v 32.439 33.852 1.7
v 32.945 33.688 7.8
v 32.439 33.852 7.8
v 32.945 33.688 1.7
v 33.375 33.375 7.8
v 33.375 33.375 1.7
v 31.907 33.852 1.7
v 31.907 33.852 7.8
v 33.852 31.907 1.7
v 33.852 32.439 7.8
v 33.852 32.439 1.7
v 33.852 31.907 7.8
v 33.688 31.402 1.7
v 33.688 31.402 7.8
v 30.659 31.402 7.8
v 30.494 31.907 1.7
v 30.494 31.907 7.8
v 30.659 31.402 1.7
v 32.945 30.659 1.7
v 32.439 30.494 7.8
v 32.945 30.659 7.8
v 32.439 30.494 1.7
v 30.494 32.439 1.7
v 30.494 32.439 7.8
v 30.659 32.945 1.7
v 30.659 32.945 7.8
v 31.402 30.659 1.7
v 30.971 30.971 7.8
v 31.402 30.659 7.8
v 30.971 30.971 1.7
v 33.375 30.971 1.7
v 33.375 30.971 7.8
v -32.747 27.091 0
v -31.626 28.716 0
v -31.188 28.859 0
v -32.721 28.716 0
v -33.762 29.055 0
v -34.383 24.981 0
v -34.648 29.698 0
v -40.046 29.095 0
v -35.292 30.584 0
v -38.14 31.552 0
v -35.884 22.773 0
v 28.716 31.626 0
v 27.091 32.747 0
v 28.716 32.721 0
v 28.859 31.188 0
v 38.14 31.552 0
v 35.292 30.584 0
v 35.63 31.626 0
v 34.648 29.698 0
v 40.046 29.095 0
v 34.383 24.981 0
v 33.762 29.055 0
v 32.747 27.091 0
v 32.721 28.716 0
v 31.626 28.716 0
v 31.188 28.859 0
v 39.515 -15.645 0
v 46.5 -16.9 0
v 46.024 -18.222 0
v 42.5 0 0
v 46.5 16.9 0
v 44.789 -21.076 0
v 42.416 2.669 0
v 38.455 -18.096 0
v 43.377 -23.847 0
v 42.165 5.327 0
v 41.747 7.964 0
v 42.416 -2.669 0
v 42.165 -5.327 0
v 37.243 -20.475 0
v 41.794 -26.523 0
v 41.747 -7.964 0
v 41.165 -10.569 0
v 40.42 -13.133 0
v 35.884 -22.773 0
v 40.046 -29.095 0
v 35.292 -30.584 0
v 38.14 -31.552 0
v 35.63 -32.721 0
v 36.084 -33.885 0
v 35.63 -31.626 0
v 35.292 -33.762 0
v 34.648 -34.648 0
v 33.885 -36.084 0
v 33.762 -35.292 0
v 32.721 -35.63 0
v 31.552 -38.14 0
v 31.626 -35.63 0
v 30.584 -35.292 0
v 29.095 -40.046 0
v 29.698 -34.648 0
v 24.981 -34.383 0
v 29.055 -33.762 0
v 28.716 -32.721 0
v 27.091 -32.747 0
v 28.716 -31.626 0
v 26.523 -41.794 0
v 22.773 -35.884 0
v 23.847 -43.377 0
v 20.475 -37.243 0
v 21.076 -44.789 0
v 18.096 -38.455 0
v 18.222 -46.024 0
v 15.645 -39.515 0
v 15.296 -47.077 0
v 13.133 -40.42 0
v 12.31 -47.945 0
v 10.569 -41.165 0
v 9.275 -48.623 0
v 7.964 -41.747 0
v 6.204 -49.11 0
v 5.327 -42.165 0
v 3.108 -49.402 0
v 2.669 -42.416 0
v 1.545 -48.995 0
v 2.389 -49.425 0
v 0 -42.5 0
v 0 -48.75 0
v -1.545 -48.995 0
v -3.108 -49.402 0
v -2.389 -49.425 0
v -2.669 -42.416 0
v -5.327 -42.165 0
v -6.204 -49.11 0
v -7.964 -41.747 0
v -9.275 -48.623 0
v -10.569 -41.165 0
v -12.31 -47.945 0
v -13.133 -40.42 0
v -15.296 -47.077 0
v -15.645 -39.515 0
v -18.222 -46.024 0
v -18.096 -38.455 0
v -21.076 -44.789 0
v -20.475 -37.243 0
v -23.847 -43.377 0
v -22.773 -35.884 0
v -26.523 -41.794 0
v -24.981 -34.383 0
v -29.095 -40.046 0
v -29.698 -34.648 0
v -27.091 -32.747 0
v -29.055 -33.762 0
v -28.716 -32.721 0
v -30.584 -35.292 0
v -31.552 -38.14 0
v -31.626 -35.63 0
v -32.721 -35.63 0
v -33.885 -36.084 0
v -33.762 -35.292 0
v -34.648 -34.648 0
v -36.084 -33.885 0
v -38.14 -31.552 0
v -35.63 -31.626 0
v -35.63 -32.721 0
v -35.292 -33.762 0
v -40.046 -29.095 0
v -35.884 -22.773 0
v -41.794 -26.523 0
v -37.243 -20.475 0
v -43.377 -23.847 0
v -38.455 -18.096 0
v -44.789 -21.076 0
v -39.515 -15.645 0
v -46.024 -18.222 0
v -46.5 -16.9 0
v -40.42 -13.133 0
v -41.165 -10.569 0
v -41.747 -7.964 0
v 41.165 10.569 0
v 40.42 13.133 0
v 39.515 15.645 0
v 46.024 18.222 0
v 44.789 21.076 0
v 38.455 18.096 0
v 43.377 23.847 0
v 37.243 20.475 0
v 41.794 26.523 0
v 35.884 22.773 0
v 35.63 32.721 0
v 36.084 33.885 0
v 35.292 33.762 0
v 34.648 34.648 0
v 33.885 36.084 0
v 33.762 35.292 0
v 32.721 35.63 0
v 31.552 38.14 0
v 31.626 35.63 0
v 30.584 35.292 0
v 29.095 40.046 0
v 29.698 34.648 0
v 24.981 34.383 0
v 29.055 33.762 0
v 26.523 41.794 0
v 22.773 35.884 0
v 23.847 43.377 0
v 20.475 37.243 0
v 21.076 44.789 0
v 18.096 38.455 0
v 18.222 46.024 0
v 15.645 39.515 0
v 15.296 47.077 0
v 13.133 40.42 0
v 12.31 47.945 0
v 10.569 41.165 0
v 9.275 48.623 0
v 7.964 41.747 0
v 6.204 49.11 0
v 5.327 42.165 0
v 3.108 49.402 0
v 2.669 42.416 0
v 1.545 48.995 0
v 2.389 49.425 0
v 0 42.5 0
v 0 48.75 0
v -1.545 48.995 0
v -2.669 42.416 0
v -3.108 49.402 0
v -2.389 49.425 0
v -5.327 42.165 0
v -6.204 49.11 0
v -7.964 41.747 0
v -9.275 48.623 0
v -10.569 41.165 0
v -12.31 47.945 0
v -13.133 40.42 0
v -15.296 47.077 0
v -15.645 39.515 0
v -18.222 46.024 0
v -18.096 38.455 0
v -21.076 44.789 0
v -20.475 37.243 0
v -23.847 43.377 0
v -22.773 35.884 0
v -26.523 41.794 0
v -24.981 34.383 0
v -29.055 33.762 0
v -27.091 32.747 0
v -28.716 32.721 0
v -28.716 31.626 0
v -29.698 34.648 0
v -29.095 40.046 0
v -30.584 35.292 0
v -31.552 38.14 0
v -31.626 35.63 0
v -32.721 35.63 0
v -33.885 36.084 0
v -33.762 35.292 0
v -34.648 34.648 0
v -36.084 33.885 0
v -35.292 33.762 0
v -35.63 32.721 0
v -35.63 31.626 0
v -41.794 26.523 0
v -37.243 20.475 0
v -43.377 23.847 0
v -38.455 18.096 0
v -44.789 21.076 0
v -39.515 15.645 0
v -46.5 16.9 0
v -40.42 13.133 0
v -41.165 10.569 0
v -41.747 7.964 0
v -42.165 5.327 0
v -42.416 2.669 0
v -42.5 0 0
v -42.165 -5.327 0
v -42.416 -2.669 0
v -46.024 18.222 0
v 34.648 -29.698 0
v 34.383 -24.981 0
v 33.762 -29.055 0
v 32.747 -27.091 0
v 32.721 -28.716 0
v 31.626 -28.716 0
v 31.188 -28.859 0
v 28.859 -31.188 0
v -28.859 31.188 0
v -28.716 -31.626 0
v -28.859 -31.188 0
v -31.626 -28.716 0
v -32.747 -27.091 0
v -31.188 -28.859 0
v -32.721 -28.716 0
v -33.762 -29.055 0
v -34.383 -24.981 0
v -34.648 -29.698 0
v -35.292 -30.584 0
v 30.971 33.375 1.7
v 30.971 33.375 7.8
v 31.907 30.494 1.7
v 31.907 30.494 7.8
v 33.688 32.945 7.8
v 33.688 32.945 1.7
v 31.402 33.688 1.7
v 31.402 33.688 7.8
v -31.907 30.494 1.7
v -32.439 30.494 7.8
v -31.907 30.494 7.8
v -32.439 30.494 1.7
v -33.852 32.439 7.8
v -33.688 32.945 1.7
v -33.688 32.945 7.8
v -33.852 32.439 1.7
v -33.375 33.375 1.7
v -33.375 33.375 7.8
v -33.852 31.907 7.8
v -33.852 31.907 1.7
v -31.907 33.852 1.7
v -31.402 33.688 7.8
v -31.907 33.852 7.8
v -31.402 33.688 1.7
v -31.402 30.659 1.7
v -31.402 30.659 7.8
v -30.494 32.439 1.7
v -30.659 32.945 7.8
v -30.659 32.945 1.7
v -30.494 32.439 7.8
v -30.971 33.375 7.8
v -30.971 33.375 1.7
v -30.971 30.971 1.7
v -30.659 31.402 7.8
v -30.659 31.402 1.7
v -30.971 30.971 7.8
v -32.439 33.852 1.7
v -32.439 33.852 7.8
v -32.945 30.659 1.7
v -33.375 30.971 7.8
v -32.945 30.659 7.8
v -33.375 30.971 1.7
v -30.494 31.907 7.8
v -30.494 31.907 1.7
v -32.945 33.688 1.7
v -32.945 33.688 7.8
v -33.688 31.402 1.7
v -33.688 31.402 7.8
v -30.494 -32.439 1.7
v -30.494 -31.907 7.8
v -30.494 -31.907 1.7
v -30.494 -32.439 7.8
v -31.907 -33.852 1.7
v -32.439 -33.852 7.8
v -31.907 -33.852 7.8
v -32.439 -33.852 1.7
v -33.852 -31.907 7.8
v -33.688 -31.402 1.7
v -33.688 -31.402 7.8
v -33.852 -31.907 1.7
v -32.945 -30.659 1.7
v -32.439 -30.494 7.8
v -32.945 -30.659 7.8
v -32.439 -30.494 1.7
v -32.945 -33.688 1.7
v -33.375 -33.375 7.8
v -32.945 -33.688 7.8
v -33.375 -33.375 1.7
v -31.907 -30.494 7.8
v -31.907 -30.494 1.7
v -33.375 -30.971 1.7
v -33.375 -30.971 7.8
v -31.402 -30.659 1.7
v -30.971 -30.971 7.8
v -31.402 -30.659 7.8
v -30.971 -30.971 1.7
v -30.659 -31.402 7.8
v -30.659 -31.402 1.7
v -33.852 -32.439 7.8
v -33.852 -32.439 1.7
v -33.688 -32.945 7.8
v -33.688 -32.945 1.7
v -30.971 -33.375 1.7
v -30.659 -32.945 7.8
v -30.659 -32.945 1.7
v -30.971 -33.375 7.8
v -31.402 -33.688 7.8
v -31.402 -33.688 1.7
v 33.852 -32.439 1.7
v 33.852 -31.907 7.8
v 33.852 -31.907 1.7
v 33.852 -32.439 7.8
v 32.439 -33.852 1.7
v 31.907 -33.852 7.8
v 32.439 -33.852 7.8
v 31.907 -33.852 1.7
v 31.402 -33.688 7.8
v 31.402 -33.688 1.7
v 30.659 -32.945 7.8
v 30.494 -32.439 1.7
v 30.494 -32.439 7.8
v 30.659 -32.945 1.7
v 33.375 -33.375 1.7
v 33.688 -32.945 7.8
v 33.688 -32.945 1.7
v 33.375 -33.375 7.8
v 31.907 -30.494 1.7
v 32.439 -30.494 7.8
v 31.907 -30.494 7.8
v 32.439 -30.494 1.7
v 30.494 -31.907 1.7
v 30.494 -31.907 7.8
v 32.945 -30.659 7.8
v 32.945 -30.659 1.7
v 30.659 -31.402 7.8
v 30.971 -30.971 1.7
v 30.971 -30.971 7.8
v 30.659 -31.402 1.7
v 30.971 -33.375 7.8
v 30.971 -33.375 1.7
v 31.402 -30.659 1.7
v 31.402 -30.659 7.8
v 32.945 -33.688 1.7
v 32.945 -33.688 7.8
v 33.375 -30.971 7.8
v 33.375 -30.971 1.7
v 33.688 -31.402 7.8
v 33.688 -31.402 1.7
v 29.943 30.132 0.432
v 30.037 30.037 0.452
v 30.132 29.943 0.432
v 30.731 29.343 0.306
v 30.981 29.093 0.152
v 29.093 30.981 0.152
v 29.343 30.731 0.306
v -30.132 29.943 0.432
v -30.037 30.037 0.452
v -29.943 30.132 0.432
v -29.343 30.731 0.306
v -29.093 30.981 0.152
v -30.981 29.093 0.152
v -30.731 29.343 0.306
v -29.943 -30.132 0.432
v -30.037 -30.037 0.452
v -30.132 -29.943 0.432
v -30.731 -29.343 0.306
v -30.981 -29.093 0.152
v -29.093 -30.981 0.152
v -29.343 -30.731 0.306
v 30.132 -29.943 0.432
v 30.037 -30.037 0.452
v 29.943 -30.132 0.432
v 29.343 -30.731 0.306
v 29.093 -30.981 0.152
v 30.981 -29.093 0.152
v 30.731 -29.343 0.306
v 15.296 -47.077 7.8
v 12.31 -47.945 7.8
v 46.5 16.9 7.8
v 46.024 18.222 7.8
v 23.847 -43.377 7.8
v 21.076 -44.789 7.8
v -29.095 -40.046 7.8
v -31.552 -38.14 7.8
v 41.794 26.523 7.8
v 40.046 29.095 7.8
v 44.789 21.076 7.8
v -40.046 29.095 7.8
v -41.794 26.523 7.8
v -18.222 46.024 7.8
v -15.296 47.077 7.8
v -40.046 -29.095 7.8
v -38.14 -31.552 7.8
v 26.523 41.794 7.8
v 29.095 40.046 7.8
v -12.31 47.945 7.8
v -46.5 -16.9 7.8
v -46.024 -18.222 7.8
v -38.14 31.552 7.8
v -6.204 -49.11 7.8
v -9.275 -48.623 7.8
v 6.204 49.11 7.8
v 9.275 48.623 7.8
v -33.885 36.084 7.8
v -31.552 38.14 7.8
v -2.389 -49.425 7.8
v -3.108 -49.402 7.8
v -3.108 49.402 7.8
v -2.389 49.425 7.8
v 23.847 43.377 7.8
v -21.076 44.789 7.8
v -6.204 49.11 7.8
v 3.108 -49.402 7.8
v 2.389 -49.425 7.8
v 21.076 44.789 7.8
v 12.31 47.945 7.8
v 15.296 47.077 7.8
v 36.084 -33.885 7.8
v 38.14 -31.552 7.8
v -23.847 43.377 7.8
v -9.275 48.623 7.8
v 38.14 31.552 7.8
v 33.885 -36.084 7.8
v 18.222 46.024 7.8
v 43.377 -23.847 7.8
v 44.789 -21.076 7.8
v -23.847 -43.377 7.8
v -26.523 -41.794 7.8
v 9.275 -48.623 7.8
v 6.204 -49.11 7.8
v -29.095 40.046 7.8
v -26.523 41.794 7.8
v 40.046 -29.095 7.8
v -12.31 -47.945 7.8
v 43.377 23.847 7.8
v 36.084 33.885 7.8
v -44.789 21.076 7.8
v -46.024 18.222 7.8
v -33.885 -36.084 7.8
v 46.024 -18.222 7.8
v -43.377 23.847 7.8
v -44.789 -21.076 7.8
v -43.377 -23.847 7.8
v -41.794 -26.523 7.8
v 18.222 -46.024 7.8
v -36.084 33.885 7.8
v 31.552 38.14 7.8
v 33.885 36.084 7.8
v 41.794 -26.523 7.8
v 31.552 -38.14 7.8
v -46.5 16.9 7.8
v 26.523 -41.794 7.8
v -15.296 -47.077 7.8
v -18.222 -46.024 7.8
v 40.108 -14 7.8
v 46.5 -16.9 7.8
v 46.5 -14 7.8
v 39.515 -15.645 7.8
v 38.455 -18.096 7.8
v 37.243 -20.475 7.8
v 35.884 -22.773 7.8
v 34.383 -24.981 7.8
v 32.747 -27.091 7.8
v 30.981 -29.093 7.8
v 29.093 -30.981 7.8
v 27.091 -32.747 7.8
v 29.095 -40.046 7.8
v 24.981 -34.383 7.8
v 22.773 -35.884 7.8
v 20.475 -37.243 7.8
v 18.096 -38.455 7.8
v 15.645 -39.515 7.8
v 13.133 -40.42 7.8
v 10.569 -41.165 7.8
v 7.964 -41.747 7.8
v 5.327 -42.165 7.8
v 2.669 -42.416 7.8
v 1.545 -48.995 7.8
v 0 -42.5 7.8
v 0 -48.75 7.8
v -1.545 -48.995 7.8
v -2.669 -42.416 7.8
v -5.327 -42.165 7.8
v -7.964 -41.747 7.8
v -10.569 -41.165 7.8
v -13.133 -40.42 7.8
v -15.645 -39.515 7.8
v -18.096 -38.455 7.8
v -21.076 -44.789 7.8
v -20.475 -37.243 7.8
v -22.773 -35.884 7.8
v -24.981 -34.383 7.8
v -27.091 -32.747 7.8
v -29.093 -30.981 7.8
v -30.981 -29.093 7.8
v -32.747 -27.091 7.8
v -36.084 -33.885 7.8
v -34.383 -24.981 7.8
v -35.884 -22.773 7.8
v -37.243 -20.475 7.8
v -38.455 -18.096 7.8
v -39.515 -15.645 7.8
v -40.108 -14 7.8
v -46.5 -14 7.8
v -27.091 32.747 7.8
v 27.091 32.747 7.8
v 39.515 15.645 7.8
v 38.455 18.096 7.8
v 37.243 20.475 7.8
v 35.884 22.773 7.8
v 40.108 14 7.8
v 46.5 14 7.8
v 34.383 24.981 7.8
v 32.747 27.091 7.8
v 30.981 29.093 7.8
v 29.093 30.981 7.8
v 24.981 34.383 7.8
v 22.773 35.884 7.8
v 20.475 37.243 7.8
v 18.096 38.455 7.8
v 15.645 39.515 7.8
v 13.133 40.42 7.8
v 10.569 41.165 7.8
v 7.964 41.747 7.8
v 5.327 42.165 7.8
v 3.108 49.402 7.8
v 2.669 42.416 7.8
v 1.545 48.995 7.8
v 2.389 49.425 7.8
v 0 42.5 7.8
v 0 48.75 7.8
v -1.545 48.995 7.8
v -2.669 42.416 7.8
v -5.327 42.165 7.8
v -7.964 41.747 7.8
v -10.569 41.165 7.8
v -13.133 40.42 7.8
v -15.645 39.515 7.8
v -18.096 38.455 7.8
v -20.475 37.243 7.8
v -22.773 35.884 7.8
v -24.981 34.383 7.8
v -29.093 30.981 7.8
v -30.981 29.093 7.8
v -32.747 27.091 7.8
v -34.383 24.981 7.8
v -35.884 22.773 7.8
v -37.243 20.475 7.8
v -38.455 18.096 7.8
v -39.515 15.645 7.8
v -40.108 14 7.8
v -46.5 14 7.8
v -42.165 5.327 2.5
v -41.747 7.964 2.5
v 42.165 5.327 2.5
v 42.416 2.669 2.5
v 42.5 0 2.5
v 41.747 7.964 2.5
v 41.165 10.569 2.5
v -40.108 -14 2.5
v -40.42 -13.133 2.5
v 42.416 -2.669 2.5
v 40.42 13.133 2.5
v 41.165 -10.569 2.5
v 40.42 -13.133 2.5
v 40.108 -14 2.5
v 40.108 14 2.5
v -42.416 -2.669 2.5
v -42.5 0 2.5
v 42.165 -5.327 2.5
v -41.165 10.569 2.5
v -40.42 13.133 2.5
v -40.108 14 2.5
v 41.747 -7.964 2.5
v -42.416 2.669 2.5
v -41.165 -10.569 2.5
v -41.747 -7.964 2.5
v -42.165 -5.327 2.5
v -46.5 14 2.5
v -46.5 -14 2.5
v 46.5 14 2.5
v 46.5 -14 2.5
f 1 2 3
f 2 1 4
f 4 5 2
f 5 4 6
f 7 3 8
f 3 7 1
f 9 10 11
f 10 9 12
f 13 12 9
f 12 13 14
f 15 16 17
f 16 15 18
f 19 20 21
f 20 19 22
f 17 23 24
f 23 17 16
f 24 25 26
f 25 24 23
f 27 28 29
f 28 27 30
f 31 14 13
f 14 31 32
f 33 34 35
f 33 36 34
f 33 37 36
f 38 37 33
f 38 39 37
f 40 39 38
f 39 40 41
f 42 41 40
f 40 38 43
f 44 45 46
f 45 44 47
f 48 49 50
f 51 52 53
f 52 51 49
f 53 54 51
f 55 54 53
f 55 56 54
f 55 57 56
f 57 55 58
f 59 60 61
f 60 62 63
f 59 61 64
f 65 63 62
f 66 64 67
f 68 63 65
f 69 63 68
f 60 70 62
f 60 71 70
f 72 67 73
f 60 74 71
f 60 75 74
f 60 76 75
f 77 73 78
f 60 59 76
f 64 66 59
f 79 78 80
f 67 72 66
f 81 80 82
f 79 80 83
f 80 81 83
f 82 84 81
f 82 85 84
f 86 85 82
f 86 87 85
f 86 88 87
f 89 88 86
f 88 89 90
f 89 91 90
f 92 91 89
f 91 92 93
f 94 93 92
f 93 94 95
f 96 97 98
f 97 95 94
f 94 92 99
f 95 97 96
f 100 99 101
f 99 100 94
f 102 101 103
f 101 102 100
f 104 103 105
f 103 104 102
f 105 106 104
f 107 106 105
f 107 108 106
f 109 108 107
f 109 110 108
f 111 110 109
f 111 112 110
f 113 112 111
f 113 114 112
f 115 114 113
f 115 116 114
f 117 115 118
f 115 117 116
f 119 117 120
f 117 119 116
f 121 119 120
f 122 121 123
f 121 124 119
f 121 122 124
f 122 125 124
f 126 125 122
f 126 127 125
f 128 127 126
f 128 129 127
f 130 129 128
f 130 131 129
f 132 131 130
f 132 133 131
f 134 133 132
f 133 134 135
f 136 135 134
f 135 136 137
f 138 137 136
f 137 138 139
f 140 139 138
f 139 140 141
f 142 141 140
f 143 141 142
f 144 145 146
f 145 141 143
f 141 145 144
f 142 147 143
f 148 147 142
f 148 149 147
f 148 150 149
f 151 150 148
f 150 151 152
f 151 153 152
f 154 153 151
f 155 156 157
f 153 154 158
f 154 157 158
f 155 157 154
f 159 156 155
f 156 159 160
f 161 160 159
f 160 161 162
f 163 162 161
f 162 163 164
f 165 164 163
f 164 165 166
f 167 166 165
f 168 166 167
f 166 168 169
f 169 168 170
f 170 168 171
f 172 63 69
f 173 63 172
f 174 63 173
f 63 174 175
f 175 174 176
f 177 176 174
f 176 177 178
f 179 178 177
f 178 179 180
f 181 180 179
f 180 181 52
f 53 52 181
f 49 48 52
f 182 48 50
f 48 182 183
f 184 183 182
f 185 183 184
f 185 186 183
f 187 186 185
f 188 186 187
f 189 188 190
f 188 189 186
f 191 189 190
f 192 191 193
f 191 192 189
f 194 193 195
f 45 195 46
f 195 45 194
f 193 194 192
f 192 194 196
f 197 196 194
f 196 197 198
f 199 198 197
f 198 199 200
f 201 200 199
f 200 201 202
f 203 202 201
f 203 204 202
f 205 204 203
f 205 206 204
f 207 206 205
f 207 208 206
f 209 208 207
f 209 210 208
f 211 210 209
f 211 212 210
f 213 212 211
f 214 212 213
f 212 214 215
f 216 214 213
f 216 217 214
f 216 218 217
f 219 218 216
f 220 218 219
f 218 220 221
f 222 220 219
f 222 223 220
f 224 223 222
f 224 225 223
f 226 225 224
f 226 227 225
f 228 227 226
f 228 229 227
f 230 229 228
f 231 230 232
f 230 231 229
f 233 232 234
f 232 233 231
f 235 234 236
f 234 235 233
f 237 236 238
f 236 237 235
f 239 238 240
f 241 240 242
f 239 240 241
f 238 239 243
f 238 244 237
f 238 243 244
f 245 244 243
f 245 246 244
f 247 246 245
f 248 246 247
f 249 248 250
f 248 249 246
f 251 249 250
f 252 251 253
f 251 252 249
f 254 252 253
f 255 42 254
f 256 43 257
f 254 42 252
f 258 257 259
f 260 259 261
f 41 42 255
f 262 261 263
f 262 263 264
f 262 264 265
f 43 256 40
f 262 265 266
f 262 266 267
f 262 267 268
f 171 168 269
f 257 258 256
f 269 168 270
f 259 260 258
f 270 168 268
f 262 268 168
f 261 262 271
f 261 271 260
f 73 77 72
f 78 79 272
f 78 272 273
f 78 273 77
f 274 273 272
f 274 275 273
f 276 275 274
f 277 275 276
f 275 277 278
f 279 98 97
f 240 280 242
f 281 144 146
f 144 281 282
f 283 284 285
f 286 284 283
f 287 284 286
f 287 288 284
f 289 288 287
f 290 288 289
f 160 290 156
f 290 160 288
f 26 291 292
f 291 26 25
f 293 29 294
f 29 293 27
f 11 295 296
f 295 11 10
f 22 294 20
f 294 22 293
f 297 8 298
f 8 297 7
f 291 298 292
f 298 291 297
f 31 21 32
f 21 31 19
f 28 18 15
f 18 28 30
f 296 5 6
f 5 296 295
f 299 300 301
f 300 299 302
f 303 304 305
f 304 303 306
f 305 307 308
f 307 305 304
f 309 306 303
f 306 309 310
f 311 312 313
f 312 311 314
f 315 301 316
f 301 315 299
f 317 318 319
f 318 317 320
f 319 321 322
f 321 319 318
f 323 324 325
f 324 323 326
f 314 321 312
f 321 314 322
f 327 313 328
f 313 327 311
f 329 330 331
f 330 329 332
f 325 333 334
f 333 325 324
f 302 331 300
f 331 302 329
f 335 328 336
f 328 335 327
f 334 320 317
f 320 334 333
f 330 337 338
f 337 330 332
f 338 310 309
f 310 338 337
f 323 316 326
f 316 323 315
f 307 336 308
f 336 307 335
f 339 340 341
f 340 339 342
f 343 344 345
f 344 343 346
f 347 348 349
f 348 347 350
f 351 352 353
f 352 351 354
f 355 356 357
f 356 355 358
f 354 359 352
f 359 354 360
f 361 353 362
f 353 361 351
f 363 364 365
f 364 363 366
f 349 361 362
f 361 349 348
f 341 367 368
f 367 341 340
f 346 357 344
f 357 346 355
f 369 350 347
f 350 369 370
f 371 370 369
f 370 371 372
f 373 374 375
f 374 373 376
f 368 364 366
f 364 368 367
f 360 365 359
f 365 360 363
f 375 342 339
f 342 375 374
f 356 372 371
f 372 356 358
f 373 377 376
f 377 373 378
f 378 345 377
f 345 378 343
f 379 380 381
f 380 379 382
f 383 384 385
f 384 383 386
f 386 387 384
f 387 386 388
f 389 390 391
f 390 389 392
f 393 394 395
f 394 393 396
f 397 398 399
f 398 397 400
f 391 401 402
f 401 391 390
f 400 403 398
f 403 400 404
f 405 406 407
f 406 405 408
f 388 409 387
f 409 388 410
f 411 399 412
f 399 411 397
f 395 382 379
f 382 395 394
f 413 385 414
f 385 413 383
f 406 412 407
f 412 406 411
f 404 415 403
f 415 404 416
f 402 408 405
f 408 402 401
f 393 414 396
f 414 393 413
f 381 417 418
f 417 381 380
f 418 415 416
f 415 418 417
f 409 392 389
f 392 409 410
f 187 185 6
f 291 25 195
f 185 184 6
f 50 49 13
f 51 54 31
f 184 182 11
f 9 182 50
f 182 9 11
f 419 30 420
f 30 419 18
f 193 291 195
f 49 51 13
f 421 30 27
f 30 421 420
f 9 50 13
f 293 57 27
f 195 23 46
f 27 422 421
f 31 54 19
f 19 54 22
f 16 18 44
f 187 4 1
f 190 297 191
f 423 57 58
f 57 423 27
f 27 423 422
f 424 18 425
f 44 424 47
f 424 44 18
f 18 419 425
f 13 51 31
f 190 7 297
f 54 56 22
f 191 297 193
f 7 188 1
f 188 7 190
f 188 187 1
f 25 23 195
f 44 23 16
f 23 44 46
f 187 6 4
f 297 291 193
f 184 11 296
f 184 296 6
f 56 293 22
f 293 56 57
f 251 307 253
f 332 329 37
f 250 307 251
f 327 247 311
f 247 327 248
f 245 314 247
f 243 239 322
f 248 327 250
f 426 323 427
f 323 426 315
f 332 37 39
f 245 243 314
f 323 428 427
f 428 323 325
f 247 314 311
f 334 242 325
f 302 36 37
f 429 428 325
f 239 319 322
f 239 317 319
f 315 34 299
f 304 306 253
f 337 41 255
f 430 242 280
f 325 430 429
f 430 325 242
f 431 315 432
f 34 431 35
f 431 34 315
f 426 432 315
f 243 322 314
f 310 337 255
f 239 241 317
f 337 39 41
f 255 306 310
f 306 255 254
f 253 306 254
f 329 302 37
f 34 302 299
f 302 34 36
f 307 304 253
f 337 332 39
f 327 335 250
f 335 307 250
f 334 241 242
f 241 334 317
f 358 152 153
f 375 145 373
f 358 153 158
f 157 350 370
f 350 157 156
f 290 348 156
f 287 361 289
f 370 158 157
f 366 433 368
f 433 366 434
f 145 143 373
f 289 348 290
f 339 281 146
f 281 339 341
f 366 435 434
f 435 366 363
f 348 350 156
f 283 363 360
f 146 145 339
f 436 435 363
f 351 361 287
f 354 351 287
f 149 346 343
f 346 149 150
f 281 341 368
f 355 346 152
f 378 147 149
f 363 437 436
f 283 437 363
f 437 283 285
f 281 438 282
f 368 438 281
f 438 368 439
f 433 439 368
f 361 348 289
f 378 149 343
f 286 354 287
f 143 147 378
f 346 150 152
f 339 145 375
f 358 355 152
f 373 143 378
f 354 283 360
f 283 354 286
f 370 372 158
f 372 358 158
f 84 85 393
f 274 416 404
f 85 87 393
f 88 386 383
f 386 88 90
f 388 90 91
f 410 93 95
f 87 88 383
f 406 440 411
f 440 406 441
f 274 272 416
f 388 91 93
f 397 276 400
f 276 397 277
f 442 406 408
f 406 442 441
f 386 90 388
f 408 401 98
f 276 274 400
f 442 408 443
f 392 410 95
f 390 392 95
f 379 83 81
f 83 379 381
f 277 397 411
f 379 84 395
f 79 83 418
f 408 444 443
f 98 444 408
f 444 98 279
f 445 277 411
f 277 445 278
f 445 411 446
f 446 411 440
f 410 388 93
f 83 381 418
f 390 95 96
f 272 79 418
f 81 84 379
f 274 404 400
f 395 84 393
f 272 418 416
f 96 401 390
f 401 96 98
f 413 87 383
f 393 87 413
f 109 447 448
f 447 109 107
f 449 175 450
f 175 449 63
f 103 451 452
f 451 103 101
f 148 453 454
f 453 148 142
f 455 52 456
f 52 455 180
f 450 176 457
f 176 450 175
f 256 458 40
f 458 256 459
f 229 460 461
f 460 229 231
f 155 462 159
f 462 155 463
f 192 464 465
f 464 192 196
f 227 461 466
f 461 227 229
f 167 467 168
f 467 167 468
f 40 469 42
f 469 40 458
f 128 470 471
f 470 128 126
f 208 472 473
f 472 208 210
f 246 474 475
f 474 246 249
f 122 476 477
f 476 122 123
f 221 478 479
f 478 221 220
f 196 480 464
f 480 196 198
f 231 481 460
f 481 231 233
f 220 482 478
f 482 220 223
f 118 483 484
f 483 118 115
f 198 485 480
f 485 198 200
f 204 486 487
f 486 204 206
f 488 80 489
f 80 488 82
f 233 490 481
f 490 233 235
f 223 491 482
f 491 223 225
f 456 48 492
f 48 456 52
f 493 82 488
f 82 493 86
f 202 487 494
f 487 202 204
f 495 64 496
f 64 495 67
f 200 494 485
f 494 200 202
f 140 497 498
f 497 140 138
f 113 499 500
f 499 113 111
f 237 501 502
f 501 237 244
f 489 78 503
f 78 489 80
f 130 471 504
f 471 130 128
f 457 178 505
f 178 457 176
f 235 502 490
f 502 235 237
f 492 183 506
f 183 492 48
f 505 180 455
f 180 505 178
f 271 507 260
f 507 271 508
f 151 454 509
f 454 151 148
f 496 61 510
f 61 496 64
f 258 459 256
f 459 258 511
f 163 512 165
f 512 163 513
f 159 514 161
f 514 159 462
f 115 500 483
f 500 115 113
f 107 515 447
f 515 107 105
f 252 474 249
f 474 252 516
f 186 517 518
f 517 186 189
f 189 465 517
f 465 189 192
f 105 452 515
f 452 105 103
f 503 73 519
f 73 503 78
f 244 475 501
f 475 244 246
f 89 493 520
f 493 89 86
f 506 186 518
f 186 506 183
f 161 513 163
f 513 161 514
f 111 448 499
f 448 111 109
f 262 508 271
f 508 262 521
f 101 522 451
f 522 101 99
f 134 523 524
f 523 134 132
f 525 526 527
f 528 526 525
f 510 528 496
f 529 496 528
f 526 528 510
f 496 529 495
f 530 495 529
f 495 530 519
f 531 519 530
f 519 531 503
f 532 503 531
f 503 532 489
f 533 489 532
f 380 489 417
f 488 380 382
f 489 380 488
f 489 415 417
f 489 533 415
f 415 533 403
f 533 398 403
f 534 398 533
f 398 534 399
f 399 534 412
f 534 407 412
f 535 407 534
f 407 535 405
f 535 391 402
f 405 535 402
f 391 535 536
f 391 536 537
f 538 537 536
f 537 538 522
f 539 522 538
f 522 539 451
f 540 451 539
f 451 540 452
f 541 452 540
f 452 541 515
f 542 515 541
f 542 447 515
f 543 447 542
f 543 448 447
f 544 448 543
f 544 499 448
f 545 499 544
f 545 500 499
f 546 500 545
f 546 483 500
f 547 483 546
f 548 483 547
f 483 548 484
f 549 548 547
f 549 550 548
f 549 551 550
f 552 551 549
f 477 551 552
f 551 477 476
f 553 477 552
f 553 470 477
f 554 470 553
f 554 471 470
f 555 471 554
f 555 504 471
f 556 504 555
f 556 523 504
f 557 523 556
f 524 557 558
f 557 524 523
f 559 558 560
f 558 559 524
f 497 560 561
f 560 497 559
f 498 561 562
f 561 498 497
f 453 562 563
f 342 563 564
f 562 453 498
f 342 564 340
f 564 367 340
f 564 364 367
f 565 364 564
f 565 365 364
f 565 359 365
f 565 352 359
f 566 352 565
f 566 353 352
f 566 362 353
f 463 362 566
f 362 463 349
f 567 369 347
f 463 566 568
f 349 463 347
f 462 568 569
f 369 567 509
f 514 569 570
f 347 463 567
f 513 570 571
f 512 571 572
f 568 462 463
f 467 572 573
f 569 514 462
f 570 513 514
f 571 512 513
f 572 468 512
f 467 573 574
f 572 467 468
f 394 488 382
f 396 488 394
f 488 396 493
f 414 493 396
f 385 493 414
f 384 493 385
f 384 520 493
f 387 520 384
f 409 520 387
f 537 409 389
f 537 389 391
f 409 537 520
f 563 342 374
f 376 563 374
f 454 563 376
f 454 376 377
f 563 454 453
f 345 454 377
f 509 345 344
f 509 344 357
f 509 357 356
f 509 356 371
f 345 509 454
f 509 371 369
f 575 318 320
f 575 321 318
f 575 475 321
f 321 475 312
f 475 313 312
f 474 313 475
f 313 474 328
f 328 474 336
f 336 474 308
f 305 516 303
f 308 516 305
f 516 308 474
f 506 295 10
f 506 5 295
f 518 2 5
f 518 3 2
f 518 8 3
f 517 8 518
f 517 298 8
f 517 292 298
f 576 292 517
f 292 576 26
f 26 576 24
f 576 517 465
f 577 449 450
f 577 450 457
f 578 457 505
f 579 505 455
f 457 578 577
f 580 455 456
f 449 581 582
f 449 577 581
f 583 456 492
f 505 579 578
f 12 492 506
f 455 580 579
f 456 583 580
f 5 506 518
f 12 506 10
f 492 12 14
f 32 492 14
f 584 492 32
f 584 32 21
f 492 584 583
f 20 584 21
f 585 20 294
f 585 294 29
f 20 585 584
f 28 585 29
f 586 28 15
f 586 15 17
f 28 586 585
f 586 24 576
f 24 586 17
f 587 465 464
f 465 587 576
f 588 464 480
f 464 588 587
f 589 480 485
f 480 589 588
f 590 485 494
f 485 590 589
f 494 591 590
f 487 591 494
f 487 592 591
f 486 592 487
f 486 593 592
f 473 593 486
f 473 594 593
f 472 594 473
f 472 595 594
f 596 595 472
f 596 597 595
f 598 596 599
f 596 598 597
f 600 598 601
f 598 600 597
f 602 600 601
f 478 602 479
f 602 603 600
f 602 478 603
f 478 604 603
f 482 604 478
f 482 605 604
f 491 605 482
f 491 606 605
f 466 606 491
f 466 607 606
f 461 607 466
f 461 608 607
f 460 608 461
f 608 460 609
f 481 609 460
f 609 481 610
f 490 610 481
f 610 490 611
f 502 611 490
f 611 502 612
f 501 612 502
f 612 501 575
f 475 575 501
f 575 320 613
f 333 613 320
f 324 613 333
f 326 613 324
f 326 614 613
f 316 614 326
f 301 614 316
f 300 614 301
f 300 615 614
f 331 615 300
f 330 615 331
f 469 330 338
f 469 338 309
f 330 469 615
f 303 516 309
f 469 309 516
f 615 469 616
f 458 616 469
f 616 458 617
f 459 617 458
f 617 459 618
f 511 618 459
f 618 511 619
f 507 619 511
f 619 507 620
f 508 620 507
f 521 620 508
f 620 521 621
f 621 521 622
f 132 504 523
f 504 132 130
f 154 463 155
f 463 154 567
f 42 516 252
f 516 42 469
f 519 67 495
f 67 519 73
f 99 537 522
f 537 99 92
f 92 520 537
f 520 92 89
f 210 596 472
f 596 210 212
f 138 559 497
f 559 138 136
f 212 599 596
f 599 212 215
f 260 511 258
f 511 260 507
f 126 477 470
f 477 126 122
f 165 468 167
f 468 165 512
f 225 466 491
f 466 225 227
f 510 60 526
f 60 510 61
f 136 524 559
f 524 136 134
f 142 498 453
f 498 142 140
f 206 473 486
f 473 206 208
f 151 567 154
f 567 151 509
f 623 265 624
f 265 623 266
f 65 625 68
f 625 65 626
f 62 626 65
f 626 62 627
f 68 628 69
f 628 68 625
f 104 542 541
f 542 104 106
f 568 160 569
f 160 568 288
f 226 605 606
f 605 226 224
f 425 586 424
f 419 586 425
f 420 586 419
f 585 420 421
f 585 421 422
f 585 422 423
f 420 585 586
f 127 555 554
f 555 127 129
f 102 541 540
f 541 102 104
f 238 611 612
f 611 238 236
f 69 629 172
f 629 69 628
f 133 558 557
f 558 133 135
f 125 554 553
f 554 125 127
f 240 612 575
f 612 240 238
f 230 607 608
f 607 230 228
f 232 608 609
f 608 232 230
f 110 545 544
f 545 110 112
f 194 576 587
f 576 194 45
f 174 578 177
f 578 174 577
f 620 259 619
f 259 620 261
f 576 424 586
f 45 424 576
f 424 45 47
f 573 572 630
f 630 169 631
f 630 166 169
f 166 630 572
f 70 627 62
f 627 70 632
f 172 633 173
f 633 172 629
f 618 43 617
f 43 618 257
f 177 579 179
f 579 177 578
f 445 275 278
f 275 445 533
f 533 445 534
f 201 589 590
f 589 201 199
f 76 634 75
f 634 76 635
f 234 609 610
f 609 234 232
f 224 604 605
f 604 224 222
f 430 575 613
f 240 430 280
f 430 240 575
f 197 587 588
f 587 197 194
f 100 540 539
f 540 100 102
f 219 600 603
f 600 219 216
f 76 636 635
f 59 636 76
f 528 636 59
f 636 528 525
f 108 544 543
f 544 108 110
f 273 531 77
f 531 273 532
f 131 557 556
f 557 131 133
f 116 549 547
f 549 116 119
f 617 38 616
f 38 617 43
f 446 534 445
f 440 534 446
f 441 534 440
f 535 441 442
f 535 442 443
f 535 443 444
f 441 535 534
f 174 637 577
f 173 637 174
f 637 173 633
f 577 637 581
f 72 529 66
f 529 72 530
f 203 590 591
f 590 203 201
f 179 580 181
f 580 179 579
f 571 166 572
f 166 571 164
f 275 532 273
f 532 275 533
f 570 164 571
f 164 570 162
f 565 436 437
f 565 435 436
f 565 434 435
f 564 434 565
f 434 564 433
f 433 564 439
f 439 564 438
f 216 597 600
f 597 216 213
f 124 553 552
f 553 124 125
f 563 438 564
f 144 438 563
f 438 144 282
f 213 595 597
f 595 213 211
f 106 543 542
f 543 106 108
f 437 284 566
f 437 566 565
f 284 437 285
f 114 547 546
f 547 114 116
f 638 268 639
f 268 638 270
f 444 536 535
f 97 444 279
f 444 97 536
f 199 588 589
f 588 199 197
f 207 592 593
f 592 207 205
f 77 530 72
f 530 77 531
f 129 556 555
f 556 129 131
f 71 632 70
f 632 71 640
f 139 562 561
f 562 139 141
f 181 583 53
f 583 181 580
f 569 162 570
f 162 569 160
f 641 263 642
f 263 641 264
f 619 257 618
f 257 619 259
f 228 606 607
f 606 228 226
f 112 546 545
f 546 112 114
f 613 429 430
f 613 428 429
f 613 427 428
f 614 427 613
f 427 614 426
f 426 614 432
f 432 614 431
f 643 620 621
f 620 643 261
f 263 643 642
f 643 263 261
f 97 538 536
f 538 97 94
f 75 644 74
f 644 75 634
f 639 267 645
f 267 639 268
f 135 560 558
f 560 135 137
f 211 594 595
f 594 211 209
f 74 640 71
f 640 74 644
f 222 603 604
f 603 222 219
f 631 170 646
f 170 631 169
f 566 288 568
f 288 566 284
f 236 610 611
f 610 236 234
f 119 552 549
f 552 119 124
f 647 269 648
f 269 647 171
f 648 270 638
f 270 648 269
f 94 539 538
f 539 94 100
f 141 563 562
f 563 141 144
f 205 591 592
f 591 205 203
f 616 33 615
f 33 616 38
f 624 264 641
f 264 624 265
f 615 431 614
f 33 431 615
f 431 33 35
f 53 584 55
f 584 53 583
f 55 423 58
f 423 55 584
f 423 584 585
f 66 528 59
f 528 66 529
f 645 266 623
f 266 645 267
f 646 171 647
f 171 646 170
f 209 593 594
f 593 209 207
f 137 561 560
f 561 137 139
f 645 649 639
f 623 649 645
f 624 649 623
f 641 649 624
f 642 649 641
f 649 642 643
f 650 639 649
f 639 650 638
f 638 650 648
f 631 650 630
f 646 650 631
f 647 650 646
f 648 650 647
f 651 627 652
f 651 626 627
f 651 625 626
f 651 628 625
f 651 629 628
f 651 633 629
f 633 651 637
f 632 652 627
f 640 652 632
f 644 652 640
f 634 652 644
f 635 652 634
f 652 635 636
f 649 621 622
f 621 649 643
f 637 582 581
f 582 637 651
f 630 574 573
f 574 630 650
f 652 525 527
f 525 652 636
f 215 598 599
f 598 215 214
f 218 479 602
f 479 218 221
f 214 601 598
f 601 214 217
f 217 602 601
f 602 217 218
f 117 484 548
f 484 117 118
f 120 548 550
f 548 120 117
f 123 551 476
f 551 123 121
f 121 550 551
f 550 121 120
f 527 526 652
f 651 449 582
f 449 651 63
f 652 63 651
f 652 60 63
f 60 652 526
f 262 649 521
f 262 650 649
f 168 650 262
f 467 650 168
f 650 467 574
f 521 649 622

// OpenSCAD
// couches station

ep=3;
d0=128;
etx=95;

d1=67; // 65;
d2=87; // 85;
d3=100;

yclou=(d0/2-d2/2)/2+d2/2;

hc=0;


//eclate();

//projection() 
//fond();

//rotate([0,0,-90-45]) translate([-16+.5,24+.5,0]) 
//trappeSD();


//color("gray") 
//translate([0,0,3+hc])
//projection()
//c1(); 


//translate([0,0,3+hc+9+hc])
//projection()
//c2();

//translate([0,0,3+hc+9+hc+6]) 
//projection() pmmaC2();

//translate([0,0,3+hc+9+hc])
supportPMMA2(false);

//rondelleCarte();


//translate([0,0,3+hc+9+hc+9+hc]) 
//projection() 
//facade();

//projection() pmmaFacade();


module eclate()
{
fond();

//rotate([0,0,-90-45]) translate([-16+.5,24+.5,0]) trappeSD();

translate([0,0,3+hc])
c1(); 

translate([0,0,3+hc+9+hc])
c2();

translate([0,0,3+hc+9+hc+6+2*hc]) 
pmmaC2();

translate([0,0,3+hc+9+hc+1.5*hc]) supportPMMA();

translate([0,0,3+hc+9+hc+9+3*hc]) 
facade();
}


module fond()
{
    difference()
    {
        silouette(ep);
        vis() cylinder(ep,1.8,1.8,$fn=20);
        translate([-12/2-19,-20/2,0]) cube([12,22,ep+.1]) ;
        translate([21,1,0]) cylinder(ep+.1,2,2,$fn=20);
        // carte sd
        rotate([0,0,-90-45]) translate([-16,24,0]) cube([32,42,ep]);        
        
        
        translate([55,40,0]) fixation(ep,10,5);
        translate([3*etx-55,40,0]) fixation(ep,10,5);
    }
}

module trappeSD()
{
ep=2.6;
x=31;
y=41;

    difference()
    {
        union()
        {
            cube([x,y,ep]);

            // griffe arriere
            #translate([.5,0,ep]) cube([x-1,4,.5]);
            
            #translate([.5,-4,ep+.5]) cube([x-1,8,ep]);
        }
        // vis
        translate([x/2,y-3.5]) cylinder(ep,3.2,1.2,$fn=20);
    }
    
}

module c1()
{
    d=75;
    ep=9;
    union()
    {
        difference()
        {
            silouette(ep);
            
            // Pods
            translate([0,0,-.5]) cylinder(ep+1,d/2,d/2,$fn=30);
            translate([etx,0,-.5]) cylinder(ep+1,d/2,d/2,$fn=30);
            translate([etx*2,0,-.5]) cylinder(ep+1,d/2,d/2,$fn=30);
            translate([etx*3,0,-.5]) cylinder(ep+1,d/2,d/2,$fn=30);
            
            // evidement barette centrale
            translate([-40,-28/2,-.5]) cube([90,28,ep+1]);
            translate([etx,-28/2,-.5]) cube([50,28,ep+1]);
            translate([2*etx,-28/2,-.5]) cube([50,28,ep+1]);
            translate([3*etx,-28/2,-.5]) cube([42,28,ep+1]);
            
            // prise usb + antene
            translate([-10,0,-.5]) cube([12,d/2+5,ep+1]);
            translate([-24/2,-d0/2,-.5]) cube([24,d0/2,ep+1]);
            translate([+24/2,-d0/2+12,-.1]) cylinder(ep+.2,3,3,$fn=20);
            translate([-24/2,-d0/2+12,-.1]) cylinder(ep+.2,3,3,$fn=20);
            
            // carte sd
            rotate([0,0,-90-45]) translate([-15,24,0]) cube([30,35,ep]);
            rotate([0,0,-90-45]) translate([0,24+42-3.5,0]) cylinder(ep+1,.8,.8,$fn=10);
            
            // composant radio
            rotate([0,0,+45]) translate([-10,24,0]) cube([20,15,ep]);            
            vis() cylinder(ep,1.8,1.8,$fn=20);
            visCrochet(ep+1,10);
            
            // fixation
            translate([55,40,0]) fixation(ep,10,10);
            translate([3*etx-55,40,0]) fixation(ep,10,10);
            trouCentreur(ep);
            
            visSupportPmma() cylinder(ep+.1,1,1,$fn=20);
        }
        plots(ep,true);
        translate([etx,0,0]) plots(ep);
        translate([2*etx,0,0]) plots(ep);
        translate([3*etx,0,0]) plots(ep);
        

    }
}

module c2()
{
    ep=9;
    d=d3;
    ly=55;  //largeur fente centrale
        difference()
        {
            silouette(ep);

            translate([0,0,-.5]) cylinder(ep+1,d/2,d/2,$fn=30);
            translate([etx,0,-.5]) cylinder(ep+1,d/2,d/2,$fn=30);
            translate([etx*2,0,-.5]) cylinder(ep+1,d/2,d/2,$fn=30);
            translate([etx*3,0,-.5]) cylinder(ep+1,d/2,d/2,$fn=30);
            
            // decoupe centrale
            translate([0,-ly/2,-.5]) cube([3*etx,ly,ep+1]);
            
            // prise usb 
            translate([-24/2,-d0/2,-.5]) cube([24,d0/2,ep+1]);
            translate([+24/2,-d0/2+12,-.1]) cylinder(ep+.2,3,3,$fn=20);
            translate([-24/2,-d0/2+12,-.1]) cylinder(ep+.2,3,3,$fn=20);
            
            vis() cylinder(ep,1.2,1.2,$fn=20);
            visCrochet(ep+1,4.2);
            
            
            trouCentreur(ep);
        }    
}

module pmmaC2()
{
d=d3-1;
ep=2.2;

dc=61; // diametre carte centrale;
ly=52; 


    difference()
    {
        union()
        {
            translate([0,0,0]) cylinder(ep,d/2,d/2,$fn=30);
            translate([etx,0,0]) cylinder(ep,d/2,d/2,$fn=30);
            translate([etx*2,0,0]) cylinder(ep,d/2,d/2,$fn=30);
            translate([etx*3,0,0]) cylinder(ep,d/2,d/2,$fn=30);       
            translate([0,-ly/2,0]) cube([3*etx,ly,ep]);
        }

        translate([0,0,-.5]) cylinder(ep+1,dc/2,dc/2,$fn=30);
        translate([etx,0,-.5]) cylinder(ep+1,dc/2,dc/2,$fn=30);
        translate([etx*2,0,-.5]) cylinder(ep+1,dc/2,dc/2,$fn=30);
        translate([etx*3,0,-.5]) cylinder(ep+1,dc/2,dc/2,$fn=30);       
        }

}


module supportPMMA2(first=false)
{

d=d3-1;
ep=7.8;

di=d2-2;

dc=61; // diametre carte centrale;

    difference()
    {
        cylinder(ep,d/2,d/2,$fn=100);
        translate([0,0,-.1]) cylinder(ep+.2,di/2,di/2,$fn=100);
        //translate([-d/2,-14,-.1]) cube([d,d,ep+.2]);
        translate([-etx/2-3,-28/2,2.5]) cube([4*etx+6,28,ep]);  
        visSupportPmma() cylinder(ep+.1,1.7,1.7,$fn=20);
        visSupportPmma() cylinder(1.7,3.5,1.7,$fn=20);
        translate([0,yclou,0]) cylinder(ep,5,5,$fn=20);
        translate([0,-yclou,0]) cylinder(ep,5,5,$fn=20);
        
        translate([d/2-3,-d/2,-.1]) cube([d,d,ep+.2]);
        translate([-d-d/2+3,-d/2,-.1]) cube([d,d,ep+.2]);
        if(first)
        {
           translate([-10,0,2]) cube([20,d,ep+.2]);

        }
    }

}

module supportPMMA()
{
d=d3-1;
ep=7;

di=d2-2;

dc=61; // diametre carte centrale;

    difference()
    {
        union()
        {
            translate([0,0,0]) cylinder(ep,d/2,d/2,$fn=30);
            translate([etx,0,0]) cylinder(ep,d/2,d/2,$fn=30);
            translate([etx*2,0,0]) cylinder(ep,d/2,d/2,$fn=30);
            translate([etx*3,0,0]) cylinder(ep,d/2,d/2,$fn=30);       
            translate([0,-50/2+1,0]) cube([3*etx,50-2,ep]);
        }

        translate([0,0,-.5]) cylinder(ep+1,di/2,di/2,$fn=30);
        translate([etx,0,-.5]) cylinder(ep+1,di/2,di/2,$fn=30);
        translate([etx*2,0,-.5]) cylinder(ep+1,di/2,di/2,$fn=30);
        translate([etx*3,0,-.5]) cylinder(ep+1,di/2,di/2,$fn=30);   
        // evidement central
        
        translate([-etx/2+3,-28/2,-.1]) cube([4*etx-6,28,ep+.2]);  
      
      #visSupportPmma() cylinder(ep+.1,1.7,1.7,$fn=20);
        }

}


module silouette(ep)
{
    hull()
    {
        translate([0,0    ,0]) cylinder(ep,d0/2,d0/2,$fn=100);
        translate([etx*3,0,0]) cylinder(ep,d0/2,d0/2,$fn=100);
    }
}

module facade()
{

    difference()
    {

        silouette(ep);
        translate([0,0,-.5]) cylinder(ep+1,d2/2,d2/2,$fn=300);
        translate([etx,0,-.5]) cylinder(ep+1,d2/2,d2/2,$fn=300);
        translate([etx*2,0,-.5]) cylinder(ep+1,d2/2,d2/2,$fn=300);
        translate([etx*3,0,-.5]) cylinder(ep+1,d2/2,d2/2,$fn=300);
        
        visCrochet(ep+1,4.2);

    }

    translate([0,0,0]) cylinder(ep,d1/2,d1/2,$fn=300);
    translate([etx,0,0]) cylinder(ep,d1/2,d1/2,$fn=300);
    translate([etx*2,0,0]) cylinder(ep,d1/2,d1/2,$fn=300);
    translate([etx*3,0,0]) cylinder(ep,d1/2,d1/2,$fn=300);
    //clous();
        
}
    
module pmmaFacade()
{

    difference()
    {

        translate([0,0,0]) cylinder(ep,d2/2,d2/2,$fn=300);
        translate([0,0,-.1]) cylinder(ep+.2,d1/2,d1/2,$fn=300);

    }

        
}

module clous()
{
    color("gray") translate([0,yclou,0]) clou();
    color("gray") translate([etx,yclou,0]) clou();
    color("gray") translate([etx*2,yclou,0]) clou();
    color("gray") translate([etx*3,yclou,0]) clou();
}
module clou()
{
    translate([0,0,15]) cylinder(3,7,7,$fn=20);
    translate([0,0,0]) cylinder(15,3,3,$fn=20);
}
    
module vis()
{
        translate([-d0/2+6,0,0]) children();
        rotate([0,0,18])translate([0,d0/2-6,0]) children();
        rotate([0,0,-18]) translate([0,-d0/2+6,0]) children();
        translate([20,-d0/2+6,0]) children();
        translate([3*etx/2,d0/2-6,0]) children();
        translate([3*etx/2,-d0/2+6,0]) children();
        translate([3*etx,0,0]) rotate([0,0,-18]) 
            translate([0,d0/2-6,0]) children();
        translate([3*etx,-d0/2+6,0]) children();
        translate([etx*3+d0/2-6,0,0]) children();
}

module visCrochet(ep,d)
{
    translate([0,yclou,0]) cylinder(ep,d/2,d/2,$fn=20);
    translate([etx,yclou,0]) cylinder(ep,d/2,d/2,$fn=20);
    translate([2*etx,yclou,0]) cylinder(ep,d/2,d/2,$fn=20);
    translate([3*etx,yclou,0]) cylinder(ep,d/2,d/2,$fn=20);
}


module visSupportPmma()
{
    for(x=[0:1:3])
    {
        translate([x*etx,0,0]) for(i=[0:1:3])
        {
        rotate([0,0,i*90+45]) translate([d2/2+2,0,0]) children(); 
        }
    }
}

module plots(ep,first=false)
{
    rotate([0,0,-16]) plot(ep);
        
    rotate([0,0,16+360/3]) plot(ep);
    if(!first)
        rotate([0,0,180+45]) plot(ep);

}


module plot(ep)
{
difference()
{
    hull()
    {   
        translate([0,32.5,0]) cylinder(ep,4,4,$fn=20);
        translate([-6,42,0]) cube([12,.1,ep]);
    }
    translate([0,32.5,0]) cylinder(ep,1.2,1.2,$fn=20);
}
}


module fixation(ep,db,dh)
{
    cylinder(ep+.1,db/2,db/2,$fn=20);
    hull()
    {
        translate([0,0,-.1])cylinder(ep+.2,dh/2,dh/2,$fn=20);
        translate([0,10,-.1])cylinder(ep+.2,dh/2,dh/2,$fn=20);
    }

}

module trouCentreur(h)
{
    translate([30,50,-.1]) cylinder(h+.2,5.2,5.2,$fn=20);
    translate([3*etx-30,50,-.1]) cylinder(h+.2,5.2,5.2,$fn=20);
    translate([60,-50,-.1]) cylinder(h+.2,5.2,5.2,$fn=20);
    translate([3*etx-60,-50,-.1]) cylinder(h+.2,5.2,5.2,$fn=20);

}


module rondelleCarte()
{
ep=2.5;
di=3.1;
de=8;

    difference()
    {
        cylinder(ep,de/2,de/2,$fn=20);
        cylinder(ep,di/2,di/2,$fn=20);
        
    }

}
